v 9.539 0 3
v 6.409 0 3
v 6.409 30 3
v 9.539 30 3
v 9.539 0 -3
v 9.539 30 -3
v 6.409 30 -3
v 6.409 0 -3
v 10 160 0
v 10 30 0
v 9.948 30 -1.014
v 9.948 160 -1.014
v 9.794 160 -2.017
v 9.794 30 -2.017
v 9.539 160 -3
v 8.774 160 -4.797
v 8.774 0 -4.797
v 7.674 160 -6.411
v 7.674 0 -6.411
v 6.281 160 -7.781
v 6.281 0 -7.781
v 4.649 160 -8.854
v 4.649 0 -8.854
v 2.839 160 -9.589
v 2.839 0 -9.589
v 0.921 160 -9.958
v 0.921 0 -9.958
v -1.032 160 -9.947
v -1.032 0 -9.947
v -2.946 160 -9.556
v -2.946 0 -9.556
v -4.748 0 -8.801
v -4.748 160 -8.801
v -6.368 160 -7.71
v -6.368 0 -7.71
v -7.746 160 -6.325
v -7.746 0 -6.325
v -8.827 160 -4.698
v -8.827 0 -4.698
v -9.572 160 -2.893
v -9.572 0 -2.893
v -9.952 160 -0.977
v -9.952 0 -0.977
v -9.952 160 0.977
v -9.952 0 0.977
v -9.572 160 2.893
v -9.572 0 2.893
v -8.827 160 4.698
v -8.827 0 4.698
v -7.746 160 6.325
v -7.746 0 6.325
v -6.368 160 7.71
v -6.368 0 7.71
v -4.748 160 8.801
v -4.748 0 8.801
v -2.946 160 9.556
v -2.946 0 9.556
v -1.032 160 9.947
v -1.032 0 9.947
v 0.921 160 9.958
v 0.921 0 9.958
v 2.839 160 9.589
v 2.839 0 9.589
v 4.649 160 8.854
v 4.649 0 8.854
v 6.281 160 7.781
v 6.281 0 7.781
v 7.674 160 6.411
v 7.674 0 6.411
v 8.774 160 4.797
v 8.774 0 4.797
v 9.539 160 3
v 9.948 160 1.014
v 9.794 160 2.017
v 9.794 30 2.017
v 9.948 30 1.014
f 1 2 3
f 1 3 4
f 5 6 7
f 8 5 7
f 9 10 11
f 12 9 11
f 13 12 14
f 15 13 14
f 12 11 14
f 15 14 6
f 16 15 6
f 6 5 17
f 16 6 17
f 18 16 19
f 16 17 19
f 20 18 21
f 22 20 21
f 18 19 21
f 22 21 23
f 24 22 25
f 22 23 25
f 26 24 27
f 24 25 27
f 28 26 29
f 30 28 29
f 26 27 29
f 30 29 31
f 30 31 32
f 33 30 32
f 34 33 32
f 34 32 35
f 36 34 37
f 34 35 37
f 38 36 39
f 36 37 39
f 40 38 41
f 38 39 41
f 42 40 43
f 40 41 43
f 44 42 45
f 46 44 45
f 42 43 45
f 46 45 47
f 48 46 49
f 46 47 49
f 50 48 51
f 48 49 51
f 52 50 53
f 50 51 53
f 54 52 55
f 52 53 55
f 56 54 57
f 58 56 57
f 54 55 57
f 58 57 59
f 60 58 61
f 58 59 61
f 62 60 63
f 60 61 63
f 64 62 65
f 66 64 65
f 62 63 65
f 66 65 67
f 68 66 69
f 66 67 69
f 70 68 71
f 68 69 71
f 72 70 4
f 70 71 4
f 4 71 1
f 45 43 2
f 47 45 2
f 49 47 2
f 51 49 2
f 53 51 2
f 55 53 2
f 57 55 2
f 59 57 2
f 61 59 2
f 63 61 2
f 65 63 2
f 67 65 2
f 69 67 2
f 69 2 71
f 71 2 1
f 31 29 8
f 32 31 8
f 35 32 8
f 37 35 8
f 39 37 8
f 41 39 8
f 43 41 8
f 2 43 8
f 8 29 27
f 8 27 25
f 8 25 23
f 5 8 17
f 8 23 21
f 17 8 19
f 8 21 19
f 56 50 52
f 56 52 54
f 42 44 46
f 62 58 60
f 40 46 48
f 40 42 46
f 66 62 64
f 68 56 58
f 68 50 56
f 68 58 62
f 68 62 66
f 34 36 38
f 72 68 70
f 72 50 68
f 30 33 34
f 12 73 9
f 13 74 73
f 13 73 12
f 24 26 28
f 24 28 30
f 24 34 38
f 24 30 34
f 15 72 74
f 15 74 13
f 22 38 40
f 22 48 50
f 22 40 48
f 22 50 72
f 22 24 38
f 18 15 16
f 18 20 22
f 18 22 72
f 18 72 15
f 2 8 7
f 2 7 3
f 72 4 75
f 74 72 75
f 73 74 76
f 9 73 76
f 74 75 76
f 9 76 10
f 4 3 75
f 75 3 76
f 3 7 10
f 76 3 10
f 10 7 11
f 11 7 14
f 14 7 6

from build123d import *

# Parameters (mm, degrees)
SKETCH1_R           = 10
BOSS_EXTRUDE1_DEPTH = 160
CUT_EXTRUDE1_DEPTH  = 30


with BuildPart() as part:
    # Sketch1 → Boss-Extrude1 (new body)
    with BuildSketch(Plane(origin=(0, 0, 0), x_dir=(1, 0, 0), z_dir=(0, 1, 0))):
        Circle(SKETCH1_R)
    extrude(amount=BOSS_EXTRUDE1_DEPTH)

    # Sketch1_3 → Cut-Extrude1 (cut)
    with BuildSketch(Plane(origin=(0, 0, 0), x_dir=(1, 0, 0), z_dir=(0, 1, 0))):
        with BuildLine():
            Line((9.539392014, 3), (6.409392014, 3))
            Line((6.409392014, 3), (6.409392014, -3))
            Line((6.409392014, -3), (9.539392014, -3))
            ThreePointArc((9.539392014, -3), (9.884177258, -1.517576993), (10, 0))
            ThreePointArc((10, 0), (9.884177258, 1.517576993), (9.539392014, 3))
        make_face()
    extrude(amount=CUT_EXTRUDE1_DEPTH, mode=Mode.SUBTRACT)


solid = part.part
